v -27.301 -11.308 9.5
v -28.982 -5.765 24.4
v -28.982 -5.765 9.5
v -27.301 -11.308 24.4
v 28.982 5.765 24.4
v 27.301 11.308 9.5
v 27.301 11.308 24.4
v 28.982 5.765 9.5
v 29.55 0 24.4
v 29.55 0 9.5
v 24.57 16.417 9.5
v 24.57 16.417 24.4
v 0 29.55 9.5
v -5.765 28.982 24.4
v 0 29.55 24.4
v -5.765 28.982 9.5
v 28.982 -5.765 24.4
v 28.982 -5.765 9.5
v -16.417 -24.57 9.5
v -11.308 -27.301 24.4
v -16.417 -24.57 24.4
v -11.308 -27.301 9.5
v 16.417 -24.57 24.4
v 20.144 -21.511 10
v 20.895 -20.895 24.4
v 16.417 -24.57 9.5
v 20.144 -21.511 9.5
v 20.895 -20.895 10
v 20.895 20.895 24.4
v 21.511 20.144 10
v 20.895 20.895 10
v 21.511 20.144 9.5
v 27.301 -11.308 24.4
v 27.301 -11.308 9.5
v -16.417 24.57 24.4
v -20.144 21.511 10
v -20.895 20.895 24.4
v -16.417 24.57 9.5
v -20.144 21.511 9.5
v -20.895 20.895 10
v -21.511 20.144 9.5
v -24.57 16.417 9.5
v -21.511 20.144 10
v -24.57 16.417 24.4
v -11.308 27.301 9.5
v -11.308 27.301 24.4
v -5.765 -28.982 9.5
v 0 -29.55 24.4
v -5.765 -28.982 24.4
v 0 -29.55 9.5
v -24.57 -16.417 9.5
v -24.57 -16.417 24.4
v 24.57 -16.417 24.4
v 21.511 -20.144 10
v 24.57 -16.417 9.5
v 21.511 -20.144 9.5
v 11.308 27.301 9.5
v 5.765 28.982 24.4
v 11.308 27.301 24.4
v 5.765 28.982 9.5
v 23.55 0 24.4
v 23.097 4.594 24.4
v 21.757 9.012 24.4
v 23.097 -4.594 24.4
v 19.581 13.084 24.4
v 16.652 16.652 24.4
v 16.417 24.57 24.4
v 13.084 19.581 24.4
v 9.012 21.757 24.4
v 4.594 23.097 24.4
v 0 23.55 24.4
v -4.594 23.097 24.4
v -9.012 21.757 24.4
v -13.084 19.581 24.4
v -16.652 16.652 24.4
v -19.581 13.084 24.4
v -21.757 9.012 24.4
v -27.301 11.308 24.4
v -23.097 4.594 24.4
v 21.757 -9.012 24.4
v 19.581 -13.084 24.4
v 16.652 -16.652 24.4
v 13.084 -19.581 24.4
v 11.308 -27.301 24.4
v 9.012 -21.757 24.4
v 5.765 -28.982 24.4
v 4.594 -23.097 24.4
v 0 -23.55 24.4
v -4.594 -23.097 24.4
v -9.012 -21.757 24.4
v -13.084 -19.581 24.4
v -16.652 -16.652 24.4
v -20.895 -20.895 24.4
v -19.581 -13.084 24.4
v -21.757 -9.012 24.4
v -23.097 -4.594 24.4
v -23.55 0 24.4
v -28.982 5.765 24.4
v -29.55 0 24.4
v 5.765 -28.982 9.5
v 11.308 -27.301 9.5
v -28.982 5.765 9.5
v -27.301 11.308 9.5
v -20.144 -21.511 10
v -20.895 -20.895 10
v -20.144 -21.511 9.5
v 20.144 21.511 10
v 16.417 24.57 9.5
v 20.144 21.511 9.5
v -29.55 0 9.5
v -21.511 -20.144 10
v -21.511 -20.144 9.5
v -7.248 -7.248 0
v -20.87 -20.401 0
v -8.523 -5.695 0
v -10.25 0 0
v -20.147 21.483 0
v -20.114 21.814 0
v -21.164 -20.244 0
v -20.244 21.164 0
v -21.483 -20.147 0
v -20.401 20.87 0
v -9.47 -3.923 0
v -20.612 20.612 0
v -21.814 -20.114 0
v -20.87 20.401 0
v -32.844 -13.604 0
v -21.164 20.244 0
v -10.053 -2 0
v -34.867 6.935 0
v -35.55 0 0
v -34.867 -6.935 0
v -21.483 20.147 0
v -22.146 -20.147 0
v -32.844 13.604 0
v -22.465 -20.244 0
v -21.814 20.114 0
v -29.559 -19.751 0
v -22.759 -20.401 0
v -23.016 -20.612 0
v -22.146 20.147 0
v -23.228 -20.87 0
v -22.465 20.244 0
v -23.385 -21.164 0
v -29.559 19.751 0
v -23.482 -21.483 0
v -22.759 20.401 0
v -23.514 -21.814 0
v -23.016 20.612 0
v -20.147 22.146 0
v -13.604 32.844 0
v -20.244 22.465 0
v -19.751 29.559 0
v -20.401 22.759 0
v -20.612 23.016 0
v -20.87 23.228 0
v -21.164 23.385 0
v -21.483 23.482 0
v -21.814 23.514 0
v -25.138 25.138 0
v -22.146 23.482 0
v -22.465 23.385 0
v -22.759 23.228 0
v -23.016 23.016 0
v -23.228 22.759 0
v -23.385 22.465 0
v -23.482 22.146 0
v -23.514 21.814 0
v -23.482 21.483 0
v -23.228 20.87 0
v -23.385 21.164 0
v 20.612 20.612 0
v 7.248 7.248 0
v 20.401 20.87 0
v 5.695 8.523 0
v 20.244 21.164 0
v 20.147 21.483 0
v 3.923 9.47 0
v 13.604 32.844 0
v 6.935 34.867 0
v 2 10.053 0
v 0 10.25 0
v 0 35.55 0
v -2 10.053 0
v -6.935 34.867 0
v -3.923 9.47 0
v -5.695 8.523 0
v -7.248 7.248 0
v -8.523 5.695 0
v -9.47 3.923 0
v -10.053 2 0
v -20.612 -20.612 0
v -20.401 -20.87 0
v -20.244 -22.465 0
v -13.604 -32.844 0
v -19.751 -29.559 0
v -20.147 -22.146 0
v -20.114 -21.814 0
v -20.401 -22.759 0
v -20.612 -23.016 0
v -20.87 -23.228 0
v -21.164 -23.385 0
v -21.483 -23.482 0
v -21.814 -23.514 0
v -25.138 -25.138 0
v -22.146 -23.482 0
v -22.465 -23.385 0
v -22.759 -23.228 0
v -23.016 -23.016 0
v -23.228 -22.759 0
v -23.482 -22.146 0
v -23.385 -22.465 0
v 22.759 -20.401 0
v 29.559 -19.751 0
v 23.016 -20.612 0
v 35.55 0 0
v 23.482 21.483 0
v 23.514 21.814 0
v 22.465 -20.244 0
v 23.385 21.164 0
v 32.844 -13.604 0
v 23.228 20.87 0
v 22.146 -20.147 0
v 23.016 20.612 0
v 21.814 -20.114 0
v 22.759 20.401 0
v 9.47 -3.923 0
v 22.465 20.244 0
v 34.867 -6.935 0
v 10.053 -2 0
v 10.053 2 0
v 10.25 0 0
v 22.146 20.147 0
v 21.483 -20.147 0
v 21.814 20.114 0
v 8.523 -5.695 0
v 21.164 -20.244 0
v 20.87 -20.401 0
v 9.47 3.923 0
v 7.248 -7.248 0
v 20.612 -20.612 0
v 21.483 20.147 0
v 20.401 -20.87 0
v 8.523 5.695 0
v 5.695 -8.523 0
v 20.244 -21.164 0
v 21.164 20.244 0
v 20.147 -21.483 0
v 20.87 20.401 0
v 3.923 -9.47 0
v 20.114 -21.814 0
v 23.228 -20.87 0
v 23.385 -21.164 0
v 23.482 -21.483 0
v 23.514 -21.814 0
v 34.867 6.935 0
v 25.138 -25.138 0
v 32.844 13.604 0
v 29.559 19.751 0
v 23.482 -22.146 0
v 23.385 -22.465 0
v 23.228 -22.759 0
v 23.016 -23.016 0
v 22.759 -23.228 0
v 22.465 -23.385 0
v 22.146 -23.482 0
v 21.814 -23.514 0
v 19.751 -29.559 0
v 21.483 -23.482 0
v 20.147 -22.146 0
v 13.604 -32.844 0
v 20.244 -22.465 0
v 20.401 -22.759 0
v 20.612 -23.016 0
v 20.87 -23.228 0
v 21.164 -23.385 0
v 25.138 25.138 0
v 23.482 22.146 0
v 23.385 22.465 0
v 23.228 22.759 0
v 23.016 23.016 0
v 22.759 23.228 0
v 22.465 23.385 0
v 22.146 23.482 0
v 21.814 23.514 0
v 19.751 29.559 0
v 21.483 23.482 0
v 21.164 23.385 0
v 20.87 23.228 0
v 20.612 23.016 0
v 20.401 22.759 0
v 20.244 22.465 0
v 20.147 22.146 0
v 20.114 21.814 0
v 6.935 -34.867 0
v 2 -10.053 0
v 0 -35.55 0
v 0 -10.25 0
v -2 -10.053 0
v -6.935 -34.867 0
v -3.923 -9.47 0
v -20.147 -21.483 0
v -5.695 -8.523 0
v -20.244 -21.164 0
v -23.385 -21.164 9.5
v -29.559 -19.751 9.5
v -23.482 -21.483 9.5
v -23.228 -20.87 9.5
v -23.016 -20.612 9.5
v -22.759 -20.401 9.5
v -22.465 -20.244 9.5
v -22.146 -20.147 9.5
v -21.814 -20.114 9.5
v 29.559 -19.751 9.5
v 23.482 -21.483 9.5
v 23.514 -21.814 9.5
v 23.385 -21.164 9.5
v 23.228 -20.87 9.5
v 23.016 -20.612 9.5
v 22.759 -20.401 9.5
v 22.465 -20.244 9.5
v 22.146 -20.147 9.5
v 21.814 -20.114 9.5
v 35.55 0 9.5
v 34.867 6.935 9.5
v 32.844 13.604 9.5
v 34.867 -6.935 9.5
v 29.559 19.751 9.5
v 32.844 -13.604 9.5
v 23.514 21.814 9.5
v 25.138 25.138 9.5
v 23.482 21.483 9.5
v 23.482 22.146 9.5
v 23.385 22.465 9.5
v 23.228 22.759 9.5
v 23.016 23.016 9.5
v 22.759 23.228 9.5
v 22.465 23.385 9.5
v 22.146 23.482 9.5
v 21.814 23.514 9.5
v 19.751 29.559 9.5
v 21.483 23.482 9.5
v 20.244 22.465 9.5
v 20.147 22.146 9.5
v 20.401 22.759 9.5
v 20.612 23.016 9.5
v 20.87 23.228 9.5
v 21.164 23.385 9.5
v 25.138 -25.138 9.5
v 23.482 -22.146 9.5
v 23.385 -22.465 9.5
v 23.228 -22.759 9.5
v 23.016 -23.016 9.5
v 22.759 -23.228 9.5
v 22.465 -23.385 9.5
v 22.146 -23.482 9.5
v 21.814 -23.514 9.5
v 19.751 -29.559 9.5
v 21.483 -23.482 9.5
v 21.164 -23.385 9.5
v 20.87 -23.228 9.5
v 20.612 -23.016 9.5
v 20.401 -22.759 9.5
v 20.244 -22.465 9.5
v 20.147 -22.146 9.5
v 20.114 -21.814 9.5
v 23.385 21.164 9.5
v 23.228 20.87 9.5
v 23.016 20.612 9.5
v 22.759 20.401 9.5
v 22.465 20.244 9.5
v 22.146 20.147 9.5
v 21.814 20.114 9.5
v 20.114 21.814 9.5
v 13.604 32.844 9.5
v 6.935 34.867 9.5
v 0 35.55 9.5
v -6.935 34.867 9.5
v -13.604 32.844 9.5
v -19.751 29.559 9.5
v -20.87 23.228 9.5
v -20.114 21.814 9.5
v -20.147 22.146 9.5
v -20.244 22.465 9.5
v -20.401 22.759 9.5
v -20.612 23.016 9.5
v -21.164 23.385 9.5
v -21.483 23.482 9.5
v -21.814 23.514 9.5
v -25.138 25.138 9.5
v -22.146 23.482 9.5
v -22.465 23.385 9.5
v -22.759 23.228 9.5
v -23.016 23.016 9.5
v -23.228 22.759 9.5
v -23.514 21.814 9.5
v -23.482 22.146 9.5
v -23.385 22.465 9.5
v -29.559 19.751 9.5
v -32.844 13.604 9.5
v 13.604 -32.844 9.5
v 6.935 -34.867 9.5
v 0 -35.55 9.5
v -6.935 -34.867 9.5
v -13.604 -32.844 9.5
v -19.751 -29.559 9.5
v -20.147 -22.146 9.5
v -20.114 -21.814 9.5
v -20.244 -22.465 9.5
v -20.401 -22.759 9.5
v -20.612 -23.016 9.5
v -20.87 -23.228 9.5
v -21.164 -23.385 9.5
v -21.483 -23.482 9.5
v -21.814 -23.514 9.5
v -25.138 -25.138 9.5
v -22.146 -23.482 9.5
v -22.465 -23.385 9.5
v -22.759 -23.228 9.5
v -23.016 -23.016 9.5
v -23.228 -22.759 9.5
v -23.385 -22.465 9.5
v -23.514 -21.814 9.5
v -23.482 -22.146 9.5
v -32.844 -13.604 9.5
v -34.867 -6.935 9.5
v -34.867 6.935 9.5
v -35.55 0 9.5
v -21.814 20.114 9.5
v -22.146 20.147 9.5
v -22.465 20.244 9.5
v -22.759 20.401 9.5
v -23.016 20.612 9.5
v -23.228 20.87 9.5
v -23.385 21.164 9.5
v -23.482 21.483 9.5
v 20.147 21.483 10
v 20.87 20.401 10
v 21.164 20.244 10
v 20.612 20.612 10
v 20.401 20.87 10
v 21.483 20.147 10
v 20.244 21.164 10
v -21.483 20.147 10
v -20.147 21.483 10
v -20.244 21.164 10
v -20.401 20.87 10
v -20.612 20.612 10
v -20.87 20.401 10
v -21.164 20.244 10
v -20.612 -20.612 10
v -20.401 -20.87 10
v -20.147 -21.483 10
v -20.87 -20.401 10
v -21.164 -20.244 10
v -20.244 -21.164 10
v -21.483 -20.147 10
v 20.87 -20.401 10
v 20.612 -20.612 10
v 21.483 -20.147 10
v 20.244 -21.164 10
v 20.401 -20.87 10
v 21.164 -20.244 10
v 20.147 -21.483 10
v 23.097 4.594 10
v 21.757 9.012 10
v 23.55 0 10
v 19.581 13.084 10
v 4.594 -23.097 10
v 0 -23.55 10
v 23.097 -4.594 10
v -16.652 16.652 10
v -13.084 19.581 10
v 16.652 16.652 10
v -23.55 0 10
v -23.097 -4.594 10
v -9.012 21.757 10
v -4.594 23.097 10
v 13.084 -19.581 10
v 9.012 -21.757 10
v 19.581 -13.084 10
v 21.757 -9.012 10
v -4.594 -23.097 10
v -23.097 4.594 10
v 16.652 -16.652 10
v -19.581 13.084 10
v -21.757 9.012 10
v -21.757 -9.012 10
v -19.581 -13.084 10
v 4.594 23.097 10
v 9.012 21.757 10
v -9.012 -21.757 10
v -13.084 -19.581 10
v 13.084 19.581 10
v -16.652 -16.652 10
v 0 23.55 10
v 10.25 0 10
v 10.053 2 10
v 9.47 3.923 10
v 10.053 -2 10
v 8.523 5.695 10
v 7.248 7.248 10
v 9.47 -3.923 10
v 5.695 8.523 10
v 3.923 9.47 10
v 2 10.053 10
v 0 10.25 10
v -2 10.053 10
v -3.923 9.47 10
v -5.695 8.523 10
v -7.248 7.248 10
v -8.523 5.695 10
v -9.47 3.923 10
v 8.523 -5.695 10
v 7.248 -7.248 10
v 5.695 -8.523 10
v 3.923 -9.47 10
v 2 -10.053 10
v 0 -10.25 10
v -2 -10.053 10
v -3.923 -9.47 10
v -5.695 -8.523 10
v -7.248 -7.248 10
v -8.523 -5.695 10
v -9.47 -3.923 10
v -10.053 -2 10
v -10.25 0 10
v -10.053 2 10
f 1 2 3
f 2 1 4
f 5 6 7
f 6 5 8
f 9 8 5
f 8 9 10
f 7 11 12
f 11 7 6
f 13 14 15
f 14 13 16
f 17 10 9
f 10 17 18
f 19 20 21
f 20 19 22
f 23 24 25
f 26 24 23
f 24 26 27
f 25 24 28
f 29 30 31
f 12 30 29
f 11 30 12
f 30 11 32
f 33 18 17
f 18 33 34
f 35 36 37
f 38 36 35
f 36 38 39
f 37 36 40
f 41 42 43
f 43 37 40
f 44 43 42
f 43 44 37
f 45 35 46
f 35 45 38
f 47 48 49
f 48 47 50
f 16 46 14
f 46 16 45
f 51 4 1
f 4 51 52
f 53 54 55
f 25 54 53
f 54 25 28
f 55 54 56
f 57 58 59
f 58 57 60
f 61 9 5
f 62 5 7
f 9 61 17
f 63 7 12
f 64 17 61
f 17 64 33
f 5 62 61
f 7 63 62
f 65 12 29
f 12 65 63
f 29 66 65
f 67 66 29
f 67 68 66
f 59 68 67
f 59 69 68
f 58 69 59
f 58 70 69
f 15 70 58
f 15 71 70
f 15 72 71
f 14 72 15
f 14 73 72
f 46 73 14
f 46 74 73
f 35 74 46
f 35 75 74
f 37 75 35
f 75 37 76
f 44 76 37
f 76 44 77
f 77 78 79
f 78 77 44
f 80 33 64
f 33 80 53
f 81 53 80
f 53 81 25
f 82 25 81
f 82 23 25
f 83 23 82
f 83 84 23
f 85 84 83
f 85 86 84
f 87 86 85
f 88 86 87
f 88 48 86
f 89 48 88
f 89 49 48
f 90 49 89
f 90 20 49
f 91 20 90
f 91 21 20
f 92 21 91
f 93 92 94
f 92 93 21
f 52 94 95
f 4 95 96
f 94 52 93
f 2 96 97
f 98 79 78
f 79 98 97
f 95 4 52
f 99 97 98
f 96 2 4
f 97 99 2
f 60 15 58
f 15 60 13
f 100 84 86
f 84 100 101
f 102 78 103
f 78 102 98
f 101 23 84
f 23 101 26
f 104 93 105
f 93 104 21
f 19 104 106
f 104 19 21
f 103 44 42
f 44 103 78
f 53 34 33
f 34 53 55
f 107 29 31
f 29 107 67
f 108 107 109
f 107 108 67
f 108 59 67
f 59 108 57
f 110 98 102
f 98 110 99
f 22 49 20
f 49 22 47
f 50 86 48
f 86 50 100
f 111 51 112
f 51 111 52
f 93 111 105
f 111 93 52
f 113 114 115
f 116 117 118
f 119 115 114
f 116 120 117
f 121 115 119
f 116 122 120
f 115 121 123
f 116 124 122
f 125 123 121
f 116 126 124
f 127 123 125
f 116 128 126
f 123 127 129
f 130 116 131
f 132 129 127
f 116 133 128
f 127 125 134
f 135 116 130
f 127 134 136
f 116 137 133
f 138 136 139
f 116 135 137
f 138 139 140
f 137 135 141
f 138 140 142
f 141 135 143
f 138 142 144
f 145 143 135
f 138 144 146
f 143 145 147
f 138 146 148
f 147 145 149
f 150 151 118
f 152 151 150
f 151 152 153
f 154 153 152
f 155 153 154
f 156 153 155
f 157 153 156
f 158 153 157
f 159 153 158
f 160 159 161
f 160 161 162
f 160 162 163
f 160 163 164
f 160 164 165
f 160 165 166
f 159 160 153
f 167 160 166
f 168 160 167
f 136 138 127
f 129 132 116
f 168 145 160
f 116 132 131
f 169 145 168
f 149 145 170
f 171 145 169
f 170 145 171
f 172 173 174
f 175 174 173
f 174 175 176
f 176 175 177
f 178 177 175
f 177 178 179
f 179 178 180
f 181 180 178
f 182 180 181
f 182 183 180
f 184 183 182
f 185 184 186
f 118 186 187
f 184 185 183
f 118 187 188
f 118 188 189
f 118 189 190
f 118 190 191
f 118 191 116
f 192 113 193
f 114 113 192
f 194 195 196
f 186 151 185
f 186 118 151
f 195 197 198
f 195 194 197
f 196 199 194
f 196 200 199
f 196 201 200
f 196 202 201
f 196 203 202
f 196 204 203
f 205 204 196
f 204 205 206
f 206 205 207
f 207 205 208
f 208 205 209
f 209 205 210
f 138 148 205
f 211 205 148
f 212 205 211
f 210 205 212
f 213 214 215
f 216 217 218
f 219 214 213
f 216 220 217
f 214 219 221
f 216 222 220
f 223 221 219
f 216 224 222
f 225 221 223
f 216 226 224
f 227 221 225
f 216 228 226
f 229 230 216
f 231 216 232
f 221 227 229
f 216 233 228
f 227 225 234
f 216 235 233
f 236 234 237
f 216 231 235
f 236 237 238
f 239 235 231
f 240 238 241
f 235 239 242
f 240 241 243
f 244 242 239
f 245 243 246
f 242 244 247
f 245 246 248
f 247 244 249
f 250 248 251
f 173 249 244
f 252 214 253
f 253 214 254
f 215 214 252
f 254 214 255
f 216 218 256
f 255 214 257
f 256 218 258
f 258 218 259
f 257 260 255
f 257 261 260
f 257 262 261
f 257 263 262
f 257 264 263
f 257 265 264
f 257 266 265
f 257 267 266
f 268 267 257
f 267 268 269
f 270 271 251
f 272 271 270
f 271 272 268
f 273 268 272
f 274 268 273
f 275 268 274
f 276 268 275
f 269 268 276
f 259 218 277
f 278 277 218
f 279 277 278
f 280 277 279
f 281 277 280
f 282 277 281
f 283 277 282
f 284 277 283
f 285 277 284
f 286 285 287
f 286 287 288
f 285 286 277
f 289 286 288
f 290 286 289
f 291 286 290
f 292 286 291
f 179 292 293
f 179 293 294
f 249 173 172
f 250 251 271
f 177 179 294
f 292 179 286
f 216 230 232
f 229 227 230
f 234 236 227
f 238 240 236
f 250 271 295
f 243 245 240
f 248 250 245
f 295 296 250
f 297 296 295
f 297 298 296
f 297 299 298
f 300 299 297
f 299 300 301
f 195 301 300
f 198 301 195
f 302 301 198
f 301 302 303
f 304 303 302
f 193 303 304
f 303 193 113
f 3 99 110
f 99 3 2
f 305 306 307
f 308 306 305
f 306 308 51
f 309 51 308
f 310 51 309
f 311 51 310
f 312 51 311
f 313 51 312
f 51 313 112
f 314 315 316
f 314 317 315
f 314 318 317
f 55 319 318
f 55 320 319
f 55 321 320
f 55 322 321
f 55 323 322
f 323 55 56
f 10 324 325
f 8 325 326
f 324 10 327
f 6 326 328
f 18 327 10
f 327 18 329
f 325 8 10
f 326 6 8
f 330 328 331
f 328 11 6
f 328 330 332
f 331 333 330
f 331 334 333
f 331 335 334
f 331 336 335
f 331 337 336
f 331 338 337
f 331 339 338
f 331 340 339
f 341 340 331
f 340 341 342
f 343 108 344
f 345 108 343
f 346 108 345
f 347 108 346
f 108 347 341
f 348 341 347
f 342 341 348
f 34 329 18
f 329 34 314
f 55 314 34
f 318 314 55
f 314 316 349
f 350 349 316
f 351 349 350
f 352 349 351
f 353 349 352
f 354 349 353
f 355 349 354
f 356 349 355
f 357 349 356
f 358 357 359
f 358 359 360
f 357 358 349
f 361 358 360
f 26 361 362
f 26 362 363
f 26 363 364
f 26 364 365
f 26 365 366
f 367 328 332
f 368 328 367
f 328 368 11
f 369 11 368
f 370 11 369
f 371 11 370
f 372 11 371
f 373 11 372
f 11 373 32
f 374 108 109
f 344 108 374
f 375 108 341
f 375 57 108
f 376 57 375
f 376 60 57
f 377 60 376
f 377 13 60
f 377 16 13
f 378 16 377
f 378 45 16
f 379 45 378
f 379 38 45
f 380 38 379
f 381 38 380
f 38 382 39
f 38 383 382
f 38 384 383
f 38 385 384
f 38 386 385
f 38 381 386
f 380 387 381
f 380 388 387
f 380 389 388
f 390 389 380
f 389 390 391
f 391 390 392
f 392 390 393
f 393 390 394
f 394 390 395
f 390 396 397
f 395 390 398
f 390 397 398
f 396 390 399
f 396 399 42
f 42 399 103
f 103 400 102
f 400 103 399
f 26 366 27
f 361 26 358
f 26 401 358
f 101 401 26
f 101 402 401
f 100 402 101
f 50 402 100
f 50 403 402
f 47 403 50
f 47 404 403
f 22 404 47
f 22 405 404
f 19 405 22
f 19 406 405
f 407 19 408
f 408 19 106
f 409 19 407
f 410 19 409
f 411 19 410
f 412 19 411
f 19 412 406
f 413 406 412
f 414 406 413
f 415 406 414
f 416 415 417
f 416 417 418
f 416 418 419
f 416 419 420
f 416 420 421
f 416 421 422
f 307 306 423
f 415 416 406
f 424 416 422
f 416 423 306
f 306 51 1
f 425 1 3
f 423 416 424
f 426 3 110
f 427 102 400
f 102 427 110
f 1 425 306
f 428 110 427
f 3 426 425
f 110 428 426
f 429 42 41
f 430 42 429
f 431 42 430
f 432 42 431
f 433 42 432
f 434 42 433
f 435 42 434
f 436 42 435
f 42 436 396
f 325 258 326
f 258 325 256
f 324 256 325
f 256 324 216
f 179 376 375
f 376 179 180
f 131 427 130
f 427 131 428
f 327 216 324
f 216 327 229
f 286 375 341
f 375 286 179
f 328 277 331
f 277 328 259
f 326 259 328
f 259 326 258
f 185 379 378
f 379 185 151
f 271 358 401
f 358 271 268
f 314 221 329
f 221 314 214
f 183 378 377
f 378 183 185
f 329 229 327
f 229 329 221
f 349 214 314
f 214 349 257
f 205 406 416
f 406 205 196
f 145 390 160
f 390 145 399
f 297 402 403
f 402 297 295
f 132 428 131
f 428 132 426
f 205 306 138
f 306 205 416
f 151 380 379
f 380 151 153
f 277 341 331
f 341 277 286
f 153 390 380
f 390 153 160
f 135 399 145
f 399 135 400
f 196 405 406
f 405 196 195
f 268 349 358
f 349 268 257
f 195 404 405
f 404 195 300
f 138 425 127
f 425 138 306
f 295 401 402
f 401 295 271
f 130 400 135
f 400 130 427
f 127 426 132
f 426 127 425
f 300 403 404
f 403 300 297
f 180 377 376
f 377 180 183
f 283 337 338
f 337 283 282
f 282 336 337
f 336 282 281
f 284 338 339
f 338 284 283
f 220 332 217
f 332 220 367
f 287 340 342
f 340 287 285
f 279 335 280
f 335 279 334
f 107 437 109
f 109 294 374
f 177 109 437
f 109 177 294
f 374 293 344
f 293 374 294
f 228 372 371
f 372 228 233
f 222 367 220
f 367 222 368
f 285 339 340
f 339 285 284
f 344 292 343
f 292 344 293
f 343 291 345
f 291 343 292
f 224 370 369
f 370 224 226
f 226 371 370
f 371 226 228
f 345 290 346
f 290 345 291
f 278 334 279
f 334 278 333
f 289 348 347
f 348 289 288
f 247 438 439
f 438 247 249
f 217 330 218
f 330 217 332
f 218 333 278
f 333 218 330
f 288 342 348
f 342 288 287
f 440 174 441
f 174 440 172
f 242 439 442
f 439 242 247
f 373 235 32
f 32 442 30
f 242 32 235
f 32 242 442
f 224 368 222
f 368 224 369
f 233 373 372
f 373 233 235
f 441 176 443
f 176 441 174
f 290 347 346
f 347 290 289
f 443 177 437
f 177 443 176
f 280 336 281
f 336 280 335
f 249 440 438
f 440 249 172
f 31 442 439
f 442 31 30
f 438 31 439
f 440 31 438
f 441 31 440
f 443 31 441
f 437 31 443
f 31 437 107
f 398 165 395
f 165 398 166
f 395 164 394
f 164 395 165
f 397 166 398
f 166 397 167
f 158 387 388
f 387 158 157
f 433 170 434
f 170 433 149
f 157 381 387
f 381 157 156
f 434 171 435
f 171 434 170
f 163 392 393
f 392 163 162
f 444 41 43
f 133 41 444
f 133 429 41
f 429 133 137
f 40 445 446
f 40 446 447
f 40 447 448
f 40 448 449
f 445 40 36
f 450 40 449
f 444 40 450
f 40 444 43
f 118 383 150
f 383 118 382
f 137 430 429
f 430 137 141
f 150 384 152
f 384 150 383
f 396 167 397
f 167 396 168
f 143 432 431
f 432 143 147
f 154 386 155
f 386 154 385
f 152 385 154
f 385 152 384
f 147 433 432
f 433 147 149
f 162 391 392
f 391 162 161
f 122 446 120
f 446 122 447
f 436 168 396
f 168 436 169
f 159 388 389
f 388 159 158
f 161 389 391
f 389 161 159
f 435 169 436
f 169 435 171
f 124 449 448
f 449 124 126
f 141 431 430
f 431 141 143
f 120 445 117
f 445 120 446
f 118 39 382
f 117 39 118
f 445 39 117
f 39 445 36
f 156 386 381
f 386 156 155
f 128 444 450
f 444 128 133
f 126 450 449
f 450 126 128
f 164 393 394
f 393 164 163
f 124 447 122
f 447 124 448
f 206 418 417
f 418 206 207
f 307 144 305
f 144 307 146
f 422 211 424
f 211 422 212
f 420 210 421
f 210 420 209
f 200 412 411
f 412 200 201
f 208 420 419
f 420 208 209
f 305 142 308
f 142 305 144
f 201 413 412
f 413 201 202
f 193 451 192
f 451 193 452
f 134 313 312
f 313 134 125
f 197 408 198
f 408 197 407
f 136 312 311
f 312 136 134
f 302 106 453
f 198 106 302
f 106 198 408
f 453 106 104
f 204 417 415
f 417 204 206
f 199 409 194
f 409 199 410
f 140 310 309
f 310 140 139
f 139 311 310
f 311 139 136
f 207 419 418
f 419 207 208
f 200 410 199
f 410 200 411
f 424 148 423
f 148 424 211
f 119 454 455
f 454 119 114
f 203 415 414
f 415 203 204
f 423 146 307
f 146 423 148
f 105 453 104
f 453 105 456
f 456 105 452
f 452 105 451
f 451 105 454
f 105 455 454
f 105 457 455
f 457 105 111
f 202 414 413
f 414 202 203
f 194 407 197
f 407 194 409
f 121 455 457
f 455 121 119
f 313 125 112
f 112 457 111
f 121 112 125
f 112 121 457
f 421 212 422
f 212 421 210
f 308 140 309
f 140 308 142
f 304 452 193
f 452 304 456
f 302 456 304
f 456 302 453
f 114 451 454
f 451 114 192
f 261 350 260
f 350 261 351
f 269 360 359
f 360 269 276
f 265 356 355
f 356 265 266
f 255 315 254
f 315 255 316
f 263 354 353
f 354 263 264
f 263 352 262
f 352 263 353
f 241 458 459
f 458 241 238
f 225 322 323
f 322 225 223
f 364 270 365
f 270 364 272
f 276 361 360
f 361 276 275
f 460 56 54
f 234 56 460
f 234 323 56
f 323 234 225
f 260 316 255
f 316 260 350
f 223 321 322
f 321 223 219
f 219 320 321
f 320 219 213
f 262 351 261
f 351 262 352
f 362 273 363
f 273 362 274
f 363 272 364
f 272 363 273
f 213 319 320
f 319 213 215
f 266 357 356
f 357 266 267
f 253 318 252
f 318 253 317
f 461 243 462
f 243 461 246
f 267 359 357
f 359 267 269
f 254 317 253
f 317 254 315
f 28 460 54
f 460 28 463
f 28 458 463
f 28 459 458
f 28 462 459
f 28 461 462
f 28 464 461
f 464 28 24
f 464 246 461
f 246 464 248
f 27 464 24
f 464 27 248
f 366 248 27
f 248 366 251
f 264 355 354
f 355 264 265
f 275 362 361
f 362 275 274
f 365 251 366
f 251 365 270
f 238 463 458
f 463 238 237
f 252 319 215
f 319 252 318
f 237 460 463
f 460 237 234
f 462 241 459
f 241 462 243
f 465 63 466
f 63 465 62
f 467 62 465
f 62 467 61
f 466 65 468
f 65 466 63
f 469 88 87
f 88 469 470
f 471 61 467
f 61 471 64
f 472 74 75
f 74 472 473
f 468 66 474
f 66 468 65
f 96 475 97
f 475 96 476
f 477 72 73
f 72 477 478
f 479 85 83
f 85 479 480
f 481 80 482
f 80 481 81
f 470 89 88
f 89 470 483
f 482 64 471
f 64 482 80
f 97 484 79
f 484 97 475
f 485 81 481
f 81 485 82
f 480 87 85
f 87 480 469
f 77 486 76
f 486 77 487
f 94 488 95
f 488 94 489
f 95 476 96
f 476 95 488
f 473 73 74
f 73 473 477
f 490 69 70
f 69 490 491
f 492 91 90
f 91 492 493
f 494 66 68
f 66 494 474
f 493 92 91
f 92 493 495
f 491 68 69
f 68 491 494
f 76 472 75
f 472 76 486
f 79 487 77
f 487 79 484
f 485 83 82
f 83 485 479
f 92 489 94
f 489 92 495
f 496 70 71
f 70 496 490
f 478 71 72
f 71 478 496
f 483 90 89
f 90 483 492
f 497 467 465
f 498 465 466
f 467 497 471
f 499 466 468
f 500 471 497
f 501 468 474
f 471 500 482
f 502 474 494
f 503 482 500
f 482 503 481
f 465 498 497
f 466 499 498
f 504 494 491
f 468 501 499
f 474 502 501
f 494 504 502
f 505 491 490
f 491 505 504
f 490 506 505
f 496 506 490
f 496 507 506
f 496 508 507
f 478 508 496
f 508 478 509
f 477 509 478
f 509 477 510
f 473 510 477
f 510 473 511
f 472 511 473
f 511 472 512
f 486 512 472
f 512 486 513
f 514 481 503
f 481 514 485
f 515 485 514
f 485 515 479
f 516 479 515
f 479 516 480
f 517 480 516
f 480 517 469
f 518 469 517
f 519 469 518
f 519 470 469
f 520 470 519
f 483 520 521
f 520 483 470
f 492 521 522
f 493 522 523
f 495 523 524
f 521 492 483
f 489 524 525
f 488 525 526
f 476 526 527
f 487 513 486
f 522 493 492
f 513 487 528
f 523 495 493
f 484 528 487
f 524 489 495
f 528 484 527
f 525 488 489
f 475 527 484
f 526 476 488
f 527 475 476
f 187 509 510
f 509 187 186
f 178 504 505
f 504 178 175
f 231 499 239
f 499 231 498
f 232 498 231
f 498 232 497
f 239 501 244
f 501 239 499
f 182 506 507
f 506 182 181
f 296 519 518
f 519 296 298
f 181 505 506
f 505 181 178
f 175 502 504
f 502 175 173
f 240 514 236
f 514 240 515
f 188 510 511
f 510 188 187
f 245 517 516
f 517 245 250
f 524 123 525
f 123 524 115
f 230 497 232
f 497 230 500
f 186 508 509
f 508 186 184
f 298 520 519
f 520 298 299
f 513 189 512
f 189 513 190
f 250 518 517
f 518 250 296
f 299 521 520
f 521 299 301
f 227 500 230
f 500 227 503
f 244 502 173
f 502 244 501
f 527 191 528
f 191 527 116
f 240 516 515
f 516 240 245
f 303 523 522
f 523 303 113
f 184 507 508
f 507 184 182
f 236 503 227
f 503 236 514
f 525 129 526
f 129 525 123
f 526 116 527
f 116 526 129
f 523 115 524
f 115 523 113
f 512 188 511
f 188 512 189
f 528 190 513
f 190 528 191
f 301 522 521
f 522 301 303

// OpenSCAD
$fn = 32;

// ----------------------------------------------------------------------
// Bearing housing: seat for 6204 (47 x 14 mm), 59.1 mm body
// ----------------------------------------------------------------------

// --- parameters (mm) ---
body_od = 59.1;           // housing outside diameter
body_h = 24.4;            // overall housing height
wall = 6;                 // wall thickness
pocket_d = 47.1;          // 6204 seat, 0.1 mm clearance
seat_h = 14.4;            // pocket depth
shoulder = 2;             // shoulder under the bearing
pass_d = 20.5;            // shaft passage
flange_dia = 71.1;        // mounting flange diameter
flange_t = 8;             // flange thickness
bolt_d = 3.4;             // flange bolt clearance
bolt_r = 30.85;           // flange bolt circle radius

module body() {
  cylinder(h = body_h, d = body_od);
}

module flange() {
  /* flange sunk 1.5 mm into the body */
  cylinder(h = flange_t + 1.5, d = flange_dia);
}

difference() {
  union() {
    body();
    flange();
  }
  translate([0, 0, body_h - seat_h]) cylinder(h = seat_h + 1, d = pocket_d);
  translate([0, 0, -1]) cylinder(h = body_h - seat_h + 1, d = pass_d);
  for (i = [0 : 3]) rotate([0, 0, 45 + i * 90]) translate([bolt_r, 0, -1])
    cylinder(h = flange_t + 3, d = bolt_d);
}
